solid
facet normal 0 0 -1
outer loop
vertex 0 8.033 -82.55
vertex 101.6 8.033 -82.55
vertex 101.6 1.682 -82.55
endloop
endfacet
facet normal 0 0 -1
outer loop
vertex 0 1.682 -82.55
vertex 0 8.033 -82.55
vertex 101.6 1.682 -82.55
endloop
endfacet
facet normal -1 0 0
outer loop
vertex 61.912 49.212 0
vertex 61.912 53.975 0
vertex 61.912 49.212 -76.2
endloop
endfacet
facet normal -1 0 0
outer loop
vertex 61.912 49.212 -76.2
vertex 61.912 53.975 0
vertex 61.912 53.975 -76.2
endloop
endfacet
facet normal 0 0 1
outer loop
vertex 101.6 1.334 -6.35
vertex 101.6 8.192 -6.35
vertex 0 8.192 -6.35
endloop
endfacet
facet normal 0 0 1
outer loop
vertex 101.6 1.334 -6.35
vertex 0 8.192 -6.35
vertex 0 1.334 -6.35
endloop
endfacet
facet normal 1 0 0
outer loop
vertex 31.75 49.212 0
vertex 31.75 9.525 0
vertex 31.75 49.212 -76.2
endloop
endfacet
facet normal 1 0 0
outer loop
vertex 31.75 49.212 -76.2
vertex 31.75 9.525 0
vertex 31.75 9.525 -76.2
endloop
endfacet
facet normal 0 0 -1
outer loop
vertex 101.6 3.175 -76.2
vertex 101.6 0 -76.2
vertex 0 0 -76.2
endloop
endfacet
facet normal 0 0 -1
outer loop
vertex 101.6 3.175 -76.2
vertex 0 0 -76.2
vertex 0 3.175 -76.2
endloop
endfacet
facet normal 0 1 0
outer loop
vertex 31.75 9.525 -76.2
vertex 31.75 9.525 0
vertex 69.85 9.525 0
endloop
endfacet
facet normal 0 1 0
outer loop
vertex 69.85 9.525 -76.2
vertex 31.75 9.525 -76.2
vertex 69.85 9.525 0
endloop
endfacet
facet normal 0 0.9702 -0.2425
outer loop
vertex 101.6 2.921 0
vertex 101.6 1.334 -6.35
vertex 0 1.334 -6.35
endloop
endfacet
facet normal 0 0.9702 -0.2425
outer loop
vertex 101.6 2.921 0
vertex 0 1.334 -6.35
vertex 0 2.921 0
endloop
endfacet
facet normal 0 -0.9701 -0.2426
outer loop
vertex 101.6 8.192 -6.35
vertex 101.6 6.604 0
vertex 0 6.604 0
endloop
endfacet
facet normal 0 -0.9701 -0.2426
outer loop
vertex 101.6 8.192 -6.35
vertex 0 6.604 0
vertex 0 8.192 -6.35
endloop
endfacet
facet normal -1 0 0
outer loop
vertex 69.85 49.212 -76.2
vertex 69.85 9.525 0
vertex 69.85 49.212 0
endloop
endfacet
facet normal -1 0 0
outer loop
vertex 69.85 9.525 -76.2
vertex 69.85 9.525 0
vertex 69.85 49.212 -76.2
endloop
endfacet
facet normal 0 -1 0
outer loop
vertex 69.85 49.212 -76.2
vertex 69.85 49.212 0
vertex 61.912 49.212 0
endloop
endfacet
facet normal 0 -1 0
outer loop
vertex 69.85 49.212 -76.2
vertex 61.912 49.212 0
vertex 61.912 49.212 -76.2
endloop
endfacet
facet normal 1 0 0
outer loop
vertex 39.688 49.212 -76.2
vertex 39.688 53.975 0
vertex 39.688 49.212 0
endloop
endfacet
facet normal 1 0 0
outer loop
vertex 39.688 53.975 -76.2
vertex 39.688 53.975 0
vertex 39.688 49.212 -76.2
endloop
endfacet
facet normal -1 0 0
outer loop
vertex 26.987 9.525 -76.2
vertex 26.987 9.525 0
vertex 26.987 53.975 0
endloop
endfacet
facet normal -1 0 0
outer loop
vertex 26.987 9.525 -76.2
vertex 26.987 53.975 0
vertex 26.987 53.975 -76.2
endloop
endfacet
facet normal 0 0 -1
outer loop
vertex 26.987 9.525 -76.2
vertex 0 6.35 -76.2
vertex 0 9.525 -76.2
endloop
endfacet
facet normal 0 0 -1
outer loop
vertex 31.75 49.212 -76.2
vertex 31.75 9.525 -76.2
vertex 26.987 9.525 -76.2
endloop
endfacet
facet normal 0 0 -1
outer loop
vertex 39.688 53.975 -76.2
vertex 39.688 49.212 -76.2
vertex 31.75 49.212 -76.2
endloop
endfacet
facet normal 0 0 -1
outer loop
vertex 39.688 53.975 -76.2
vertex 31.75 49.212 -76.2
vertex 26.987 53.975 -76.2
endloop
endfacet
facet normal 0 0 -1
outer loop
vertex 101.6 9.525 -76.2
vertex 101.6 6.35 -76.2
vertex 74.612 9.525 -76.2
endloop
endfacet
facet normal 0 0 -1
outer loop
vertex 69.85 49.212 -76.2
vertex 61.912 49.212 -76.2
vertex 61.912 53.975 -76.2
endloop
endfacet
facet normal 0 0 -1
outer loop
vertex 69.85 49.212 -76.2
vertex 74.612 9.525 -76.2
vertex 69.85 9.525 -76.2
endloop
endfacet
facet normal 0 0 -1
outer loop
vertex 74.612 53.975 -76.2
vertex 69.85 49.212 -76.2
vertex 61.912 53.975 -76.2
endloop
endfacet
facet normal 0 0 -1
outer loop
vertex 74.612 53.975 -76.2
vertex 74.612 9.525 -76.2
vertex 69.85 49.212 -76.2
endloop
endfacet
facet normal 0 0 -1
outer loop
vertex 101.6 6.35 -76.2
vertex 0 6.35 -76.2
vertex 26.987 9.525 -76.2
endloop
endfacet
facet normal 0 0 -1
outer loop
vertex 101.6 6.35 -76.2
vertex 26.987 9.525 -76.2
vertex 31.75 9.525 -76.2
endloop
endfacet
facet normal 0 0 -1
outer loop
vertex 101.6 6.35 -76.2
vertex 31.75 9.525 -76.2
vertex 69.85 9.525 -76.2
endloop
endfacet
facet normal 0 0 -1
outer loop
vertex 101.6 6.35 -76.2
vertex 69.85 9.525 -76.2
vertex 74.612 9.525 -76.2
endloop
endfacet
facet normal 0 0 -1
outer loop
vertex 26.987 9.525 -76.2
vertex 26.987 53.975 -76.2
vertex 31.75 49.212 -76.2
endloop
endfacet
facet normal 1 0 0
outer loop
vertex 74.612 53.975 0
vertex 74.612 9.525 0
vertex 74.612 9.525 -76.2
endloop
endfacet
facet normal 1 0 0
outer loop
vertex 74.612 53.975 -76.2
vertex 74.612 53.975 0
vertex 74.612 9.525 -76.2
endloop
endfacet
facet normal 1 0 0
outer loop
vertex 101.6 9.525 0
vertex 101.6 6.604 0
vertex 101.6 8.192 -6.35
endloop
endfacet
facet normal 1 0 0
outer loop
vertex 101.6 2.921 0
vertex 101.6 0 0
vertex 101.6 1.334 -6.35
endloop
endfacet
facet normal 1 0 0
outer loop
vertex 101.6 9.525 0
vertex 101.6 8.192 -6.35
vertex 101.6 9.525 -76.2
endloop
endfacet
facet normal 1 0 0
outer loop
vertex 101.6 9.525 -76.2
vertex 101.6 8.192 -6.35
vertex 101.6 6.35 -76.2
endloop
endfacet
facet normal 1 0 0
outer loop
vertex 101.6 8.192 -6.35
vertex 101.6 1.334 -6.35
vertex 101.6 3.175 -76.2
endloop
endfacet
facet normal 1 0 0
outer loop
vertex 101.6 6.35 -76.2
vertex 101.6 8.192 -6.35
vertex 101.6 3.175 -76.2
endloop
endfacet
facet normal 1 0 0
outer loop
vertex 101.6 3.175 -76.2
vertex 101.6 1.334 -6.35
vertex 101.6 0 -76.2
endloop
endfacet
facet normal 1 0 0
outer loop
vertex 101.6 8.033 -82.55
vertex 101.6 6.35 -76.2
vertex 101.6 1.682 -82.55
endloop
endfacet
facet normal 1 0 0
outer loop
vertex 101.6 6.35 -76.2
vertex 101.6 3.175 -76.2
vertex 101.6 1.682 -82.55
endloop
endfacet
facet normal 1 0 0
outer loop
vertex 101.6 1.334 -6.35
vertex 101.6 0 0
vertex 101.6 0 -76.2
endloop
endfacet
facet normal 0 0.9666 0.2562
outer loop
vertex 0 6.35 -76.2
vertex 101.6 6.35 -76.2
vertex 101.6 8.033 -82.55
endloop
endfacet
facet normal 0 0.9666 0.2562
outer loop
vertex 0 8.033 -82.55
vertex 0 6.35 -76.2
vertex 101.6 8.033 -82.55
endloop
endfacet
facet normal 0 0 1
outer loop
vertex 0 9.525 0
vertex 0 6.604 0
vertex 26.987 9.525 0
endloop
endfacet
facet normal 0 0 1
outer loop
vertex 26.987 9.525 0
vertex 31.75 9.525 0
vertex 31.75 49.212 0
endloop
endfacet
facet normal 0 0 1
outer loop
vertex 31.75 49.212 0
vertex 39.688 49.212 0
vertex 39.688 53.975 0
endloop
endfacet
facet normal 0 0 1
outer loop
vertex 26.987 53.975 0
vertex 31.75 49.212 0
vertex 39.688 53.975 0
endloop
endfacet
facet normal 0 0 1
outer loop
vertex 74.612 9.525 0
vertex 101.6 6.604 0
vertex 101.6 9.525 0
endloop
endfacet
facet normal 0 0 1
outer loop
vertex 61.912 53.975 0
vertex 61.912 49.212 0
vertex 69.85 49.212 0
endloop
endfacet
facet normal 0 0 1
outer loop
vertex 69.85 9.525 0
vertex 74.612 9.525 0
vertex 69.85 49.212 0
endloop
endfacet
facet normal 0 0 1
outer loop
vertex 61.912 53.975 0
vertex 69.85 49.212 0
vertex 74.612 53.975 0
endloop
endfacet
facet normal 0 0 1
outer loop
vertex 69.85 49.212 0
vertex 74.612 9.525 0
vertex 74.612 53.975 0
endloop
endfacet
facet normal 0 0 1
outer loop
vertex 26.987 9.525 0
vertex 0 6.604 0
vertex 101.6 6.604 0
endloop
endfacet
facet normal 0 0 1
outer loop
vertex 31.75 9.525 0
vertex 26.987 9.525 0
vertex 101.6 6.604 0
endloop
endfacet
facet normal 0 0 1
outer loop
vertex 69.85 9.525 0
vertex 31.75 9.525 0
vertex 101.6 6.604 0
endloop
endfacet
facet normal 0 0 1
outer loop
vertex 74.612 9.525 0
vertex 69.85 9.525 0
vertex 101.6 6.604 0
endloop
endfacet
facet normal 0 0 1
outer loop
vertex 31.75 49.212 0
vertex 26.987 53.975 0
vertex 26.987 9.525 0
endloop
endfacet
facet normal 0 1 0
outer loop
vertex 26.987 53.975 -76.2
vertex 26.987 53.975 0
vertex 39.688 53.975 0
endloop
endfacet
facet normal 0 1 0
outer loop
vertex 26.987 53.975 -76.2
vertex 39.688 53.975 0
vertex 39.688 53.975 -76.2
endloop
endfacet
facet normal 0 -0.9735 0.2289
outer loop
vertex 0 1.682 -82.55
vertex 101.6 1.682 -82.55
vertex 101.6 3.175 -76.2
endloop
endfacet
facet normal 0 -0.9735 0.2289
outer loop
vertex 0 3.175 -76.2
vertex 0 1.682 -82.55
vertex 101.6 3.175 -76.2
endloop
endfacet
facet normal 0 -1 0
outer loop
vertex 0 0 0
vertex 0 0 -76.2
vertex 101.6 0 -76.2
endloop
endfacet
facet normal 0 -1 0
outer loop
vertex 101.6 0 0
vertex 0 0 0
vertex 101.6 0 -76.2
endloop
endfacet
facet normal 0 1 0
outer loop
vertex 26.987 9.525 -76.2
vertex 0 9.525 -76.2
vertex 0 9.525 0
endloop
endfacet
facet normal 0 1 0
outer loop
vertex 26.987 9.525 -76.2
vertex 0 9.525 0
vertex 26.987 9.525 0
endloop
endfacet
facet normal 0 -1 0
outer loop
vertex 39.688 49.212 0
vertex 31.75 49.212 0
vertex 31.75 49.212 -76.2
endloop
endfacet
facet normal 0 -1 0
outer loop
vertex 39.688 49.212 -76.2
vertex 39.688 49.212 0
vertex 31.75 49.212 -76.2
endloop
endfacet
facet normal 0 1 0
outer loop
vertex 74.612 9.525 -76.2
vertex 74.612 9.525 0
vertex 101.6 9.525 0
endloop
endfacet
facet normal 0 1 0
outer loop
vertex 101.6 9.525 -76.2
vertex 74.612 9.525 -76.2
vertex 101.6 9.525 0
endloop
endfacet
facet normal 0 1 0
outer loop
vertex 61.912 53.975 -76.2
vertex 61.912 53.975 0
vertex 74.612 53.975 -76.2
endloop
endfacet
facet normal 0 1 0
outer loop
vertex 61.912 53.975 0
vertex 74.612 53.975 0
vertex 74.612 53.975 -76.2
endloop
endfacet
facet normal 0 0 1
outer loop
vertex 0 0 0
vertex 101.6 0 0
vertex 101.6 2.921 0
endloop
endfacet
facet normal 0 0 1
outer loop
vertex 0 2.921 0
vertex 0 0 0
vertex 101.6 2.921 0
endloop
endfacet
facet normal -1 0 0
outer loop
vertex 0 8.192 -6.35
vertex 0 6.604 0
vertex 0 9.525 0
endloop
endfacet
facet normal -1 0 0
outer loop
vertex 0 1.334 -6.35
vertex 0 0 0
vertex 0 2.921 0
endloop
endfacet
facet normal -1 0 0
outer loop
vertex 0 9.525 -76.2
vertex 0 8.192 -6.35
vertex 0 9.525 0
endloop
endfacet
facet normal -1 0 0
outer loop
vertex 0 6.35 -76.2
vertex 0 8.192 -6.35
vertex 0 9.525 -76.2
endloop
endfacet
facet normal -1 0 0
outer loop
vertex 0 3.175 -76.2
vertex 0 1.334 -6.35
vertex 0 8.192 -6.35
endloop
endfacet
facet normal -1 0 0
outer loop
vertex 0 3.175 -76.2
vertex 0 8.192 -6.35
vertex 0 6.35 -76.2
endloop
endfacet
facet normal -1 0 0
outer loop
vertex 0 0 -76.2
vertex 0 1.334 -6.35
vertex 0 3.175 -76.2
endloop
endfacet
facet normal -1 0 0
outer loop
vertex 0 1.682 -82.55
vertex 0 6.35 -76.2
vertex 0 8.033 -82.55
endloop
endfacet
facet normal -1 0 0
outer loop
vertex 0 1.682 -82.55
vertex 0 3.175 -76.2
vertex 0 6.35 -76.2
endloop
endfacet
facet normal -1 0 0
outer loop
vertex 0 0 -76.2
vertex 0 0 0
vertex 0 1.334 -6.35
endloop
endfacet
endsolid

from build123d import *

# Parameters (mm, degrees)
SKETCH1_W           = 101.6
SKETCH1_H           = 76.2
BOSS_EXTRUDE1_DEPTH = 9.525
SKETCH2_W           = 4.7625
SKETCH2_H           = 76.2
BOSS_EXTRUDE2_DEPTH = 44.45
SKETCH3_W           = 76.2
SKETCH3_H           = 4.7625
BOSS_EXTRUDE3_DEPTH = 7.9375
BOSS_EXTRUDE4_DEPTH = 101.6
CUT_EXTRUDE1_DEPTH  = 142.599304818


with BuildPart() as part:
    # Sketch1 → Boss-Extrude1 (new body)
    with BuildSketch(Plane(origin=(0, 0, 0), x_dir=(1, 0, 0), z_dir=(0, 1, 0))):
        with Locations((50.8, 38.1)):
            Rectangle(SKETCH1_W, SKETCH1_H)
    extrude(amount=BOSS_EXTRUDE1_DEPTH)

    # Sketch2 → Boss-Extrude2 (add)
    with BuildSketch(Plane(origin=(0, 9.525, 0), x_dir=(1, 0, 0), z_dir=(0, 1, 0))):
        with Locations((29.36875, 38.1)):
            Rectangle(SKETCH2_W, SKETCH2_H)
    boss_extrude2 = extrude(amount=BOSS_EXTRUDE2_DEPTH)

    # Sketch3 → Boss-Extrude3 (add)
    with BuildSketch(Plane(origin=(31.75, 0, 0), x_dir=(0, 0, -1), z_dir=(1, 0, 0))):
        with Locations((38.1, 51.59375)):
            Rectangle(SKETCH3_W, SKETCH3_H)
    boss_extrude3 = extrude(amount=BOSS_EXTRUDE3_DEPTH)

    # Mirror1: Boss-Extrude2, Boss-Extrude3 across plane
    add(boss_extrude2.mirror(Plane(origin=(50.8, 0, 0), x_dir=(0, 0, 1), z_dir=(1, 0, 0))))
    add(boss_extrude3.mirror(Plane(origin=(50.8, 0, 0), x_dir=(0, 0, 1), z_dir=(1, 0, 0))))

    # Sketch7 → Boss-Extrude4 (add)
    with BuildSketch(Plane(origin=(101.6, 0, 0), x_dir=(0, 0, -1), z_dir=(1, 0, 0))):
        Polygon((76.2, 3.175), (76.2, 6.35), (82.55, 8.03294256), (82.55, 1.682230673), align=None)
    extrude(amount=-BOSS_EXTRUDE4_DEPTH)

    # Sketch9 → Cut-Extrude1 (cut, through all)
    with BuildSketch(Plane(origin=(101.6, 0, 0), x_dir=(0, 0, -1), z_dir=(1, 0, 0))):
        Polygon((0, 2.921), (0, 6.604), (6.35, 8.1915), (6.35, 1.3335), align=None)
    extrude(amount=-CUT_EXTRUDE1_DEPTH, mode=Mode.SUBTRACT)


solid = part.part
